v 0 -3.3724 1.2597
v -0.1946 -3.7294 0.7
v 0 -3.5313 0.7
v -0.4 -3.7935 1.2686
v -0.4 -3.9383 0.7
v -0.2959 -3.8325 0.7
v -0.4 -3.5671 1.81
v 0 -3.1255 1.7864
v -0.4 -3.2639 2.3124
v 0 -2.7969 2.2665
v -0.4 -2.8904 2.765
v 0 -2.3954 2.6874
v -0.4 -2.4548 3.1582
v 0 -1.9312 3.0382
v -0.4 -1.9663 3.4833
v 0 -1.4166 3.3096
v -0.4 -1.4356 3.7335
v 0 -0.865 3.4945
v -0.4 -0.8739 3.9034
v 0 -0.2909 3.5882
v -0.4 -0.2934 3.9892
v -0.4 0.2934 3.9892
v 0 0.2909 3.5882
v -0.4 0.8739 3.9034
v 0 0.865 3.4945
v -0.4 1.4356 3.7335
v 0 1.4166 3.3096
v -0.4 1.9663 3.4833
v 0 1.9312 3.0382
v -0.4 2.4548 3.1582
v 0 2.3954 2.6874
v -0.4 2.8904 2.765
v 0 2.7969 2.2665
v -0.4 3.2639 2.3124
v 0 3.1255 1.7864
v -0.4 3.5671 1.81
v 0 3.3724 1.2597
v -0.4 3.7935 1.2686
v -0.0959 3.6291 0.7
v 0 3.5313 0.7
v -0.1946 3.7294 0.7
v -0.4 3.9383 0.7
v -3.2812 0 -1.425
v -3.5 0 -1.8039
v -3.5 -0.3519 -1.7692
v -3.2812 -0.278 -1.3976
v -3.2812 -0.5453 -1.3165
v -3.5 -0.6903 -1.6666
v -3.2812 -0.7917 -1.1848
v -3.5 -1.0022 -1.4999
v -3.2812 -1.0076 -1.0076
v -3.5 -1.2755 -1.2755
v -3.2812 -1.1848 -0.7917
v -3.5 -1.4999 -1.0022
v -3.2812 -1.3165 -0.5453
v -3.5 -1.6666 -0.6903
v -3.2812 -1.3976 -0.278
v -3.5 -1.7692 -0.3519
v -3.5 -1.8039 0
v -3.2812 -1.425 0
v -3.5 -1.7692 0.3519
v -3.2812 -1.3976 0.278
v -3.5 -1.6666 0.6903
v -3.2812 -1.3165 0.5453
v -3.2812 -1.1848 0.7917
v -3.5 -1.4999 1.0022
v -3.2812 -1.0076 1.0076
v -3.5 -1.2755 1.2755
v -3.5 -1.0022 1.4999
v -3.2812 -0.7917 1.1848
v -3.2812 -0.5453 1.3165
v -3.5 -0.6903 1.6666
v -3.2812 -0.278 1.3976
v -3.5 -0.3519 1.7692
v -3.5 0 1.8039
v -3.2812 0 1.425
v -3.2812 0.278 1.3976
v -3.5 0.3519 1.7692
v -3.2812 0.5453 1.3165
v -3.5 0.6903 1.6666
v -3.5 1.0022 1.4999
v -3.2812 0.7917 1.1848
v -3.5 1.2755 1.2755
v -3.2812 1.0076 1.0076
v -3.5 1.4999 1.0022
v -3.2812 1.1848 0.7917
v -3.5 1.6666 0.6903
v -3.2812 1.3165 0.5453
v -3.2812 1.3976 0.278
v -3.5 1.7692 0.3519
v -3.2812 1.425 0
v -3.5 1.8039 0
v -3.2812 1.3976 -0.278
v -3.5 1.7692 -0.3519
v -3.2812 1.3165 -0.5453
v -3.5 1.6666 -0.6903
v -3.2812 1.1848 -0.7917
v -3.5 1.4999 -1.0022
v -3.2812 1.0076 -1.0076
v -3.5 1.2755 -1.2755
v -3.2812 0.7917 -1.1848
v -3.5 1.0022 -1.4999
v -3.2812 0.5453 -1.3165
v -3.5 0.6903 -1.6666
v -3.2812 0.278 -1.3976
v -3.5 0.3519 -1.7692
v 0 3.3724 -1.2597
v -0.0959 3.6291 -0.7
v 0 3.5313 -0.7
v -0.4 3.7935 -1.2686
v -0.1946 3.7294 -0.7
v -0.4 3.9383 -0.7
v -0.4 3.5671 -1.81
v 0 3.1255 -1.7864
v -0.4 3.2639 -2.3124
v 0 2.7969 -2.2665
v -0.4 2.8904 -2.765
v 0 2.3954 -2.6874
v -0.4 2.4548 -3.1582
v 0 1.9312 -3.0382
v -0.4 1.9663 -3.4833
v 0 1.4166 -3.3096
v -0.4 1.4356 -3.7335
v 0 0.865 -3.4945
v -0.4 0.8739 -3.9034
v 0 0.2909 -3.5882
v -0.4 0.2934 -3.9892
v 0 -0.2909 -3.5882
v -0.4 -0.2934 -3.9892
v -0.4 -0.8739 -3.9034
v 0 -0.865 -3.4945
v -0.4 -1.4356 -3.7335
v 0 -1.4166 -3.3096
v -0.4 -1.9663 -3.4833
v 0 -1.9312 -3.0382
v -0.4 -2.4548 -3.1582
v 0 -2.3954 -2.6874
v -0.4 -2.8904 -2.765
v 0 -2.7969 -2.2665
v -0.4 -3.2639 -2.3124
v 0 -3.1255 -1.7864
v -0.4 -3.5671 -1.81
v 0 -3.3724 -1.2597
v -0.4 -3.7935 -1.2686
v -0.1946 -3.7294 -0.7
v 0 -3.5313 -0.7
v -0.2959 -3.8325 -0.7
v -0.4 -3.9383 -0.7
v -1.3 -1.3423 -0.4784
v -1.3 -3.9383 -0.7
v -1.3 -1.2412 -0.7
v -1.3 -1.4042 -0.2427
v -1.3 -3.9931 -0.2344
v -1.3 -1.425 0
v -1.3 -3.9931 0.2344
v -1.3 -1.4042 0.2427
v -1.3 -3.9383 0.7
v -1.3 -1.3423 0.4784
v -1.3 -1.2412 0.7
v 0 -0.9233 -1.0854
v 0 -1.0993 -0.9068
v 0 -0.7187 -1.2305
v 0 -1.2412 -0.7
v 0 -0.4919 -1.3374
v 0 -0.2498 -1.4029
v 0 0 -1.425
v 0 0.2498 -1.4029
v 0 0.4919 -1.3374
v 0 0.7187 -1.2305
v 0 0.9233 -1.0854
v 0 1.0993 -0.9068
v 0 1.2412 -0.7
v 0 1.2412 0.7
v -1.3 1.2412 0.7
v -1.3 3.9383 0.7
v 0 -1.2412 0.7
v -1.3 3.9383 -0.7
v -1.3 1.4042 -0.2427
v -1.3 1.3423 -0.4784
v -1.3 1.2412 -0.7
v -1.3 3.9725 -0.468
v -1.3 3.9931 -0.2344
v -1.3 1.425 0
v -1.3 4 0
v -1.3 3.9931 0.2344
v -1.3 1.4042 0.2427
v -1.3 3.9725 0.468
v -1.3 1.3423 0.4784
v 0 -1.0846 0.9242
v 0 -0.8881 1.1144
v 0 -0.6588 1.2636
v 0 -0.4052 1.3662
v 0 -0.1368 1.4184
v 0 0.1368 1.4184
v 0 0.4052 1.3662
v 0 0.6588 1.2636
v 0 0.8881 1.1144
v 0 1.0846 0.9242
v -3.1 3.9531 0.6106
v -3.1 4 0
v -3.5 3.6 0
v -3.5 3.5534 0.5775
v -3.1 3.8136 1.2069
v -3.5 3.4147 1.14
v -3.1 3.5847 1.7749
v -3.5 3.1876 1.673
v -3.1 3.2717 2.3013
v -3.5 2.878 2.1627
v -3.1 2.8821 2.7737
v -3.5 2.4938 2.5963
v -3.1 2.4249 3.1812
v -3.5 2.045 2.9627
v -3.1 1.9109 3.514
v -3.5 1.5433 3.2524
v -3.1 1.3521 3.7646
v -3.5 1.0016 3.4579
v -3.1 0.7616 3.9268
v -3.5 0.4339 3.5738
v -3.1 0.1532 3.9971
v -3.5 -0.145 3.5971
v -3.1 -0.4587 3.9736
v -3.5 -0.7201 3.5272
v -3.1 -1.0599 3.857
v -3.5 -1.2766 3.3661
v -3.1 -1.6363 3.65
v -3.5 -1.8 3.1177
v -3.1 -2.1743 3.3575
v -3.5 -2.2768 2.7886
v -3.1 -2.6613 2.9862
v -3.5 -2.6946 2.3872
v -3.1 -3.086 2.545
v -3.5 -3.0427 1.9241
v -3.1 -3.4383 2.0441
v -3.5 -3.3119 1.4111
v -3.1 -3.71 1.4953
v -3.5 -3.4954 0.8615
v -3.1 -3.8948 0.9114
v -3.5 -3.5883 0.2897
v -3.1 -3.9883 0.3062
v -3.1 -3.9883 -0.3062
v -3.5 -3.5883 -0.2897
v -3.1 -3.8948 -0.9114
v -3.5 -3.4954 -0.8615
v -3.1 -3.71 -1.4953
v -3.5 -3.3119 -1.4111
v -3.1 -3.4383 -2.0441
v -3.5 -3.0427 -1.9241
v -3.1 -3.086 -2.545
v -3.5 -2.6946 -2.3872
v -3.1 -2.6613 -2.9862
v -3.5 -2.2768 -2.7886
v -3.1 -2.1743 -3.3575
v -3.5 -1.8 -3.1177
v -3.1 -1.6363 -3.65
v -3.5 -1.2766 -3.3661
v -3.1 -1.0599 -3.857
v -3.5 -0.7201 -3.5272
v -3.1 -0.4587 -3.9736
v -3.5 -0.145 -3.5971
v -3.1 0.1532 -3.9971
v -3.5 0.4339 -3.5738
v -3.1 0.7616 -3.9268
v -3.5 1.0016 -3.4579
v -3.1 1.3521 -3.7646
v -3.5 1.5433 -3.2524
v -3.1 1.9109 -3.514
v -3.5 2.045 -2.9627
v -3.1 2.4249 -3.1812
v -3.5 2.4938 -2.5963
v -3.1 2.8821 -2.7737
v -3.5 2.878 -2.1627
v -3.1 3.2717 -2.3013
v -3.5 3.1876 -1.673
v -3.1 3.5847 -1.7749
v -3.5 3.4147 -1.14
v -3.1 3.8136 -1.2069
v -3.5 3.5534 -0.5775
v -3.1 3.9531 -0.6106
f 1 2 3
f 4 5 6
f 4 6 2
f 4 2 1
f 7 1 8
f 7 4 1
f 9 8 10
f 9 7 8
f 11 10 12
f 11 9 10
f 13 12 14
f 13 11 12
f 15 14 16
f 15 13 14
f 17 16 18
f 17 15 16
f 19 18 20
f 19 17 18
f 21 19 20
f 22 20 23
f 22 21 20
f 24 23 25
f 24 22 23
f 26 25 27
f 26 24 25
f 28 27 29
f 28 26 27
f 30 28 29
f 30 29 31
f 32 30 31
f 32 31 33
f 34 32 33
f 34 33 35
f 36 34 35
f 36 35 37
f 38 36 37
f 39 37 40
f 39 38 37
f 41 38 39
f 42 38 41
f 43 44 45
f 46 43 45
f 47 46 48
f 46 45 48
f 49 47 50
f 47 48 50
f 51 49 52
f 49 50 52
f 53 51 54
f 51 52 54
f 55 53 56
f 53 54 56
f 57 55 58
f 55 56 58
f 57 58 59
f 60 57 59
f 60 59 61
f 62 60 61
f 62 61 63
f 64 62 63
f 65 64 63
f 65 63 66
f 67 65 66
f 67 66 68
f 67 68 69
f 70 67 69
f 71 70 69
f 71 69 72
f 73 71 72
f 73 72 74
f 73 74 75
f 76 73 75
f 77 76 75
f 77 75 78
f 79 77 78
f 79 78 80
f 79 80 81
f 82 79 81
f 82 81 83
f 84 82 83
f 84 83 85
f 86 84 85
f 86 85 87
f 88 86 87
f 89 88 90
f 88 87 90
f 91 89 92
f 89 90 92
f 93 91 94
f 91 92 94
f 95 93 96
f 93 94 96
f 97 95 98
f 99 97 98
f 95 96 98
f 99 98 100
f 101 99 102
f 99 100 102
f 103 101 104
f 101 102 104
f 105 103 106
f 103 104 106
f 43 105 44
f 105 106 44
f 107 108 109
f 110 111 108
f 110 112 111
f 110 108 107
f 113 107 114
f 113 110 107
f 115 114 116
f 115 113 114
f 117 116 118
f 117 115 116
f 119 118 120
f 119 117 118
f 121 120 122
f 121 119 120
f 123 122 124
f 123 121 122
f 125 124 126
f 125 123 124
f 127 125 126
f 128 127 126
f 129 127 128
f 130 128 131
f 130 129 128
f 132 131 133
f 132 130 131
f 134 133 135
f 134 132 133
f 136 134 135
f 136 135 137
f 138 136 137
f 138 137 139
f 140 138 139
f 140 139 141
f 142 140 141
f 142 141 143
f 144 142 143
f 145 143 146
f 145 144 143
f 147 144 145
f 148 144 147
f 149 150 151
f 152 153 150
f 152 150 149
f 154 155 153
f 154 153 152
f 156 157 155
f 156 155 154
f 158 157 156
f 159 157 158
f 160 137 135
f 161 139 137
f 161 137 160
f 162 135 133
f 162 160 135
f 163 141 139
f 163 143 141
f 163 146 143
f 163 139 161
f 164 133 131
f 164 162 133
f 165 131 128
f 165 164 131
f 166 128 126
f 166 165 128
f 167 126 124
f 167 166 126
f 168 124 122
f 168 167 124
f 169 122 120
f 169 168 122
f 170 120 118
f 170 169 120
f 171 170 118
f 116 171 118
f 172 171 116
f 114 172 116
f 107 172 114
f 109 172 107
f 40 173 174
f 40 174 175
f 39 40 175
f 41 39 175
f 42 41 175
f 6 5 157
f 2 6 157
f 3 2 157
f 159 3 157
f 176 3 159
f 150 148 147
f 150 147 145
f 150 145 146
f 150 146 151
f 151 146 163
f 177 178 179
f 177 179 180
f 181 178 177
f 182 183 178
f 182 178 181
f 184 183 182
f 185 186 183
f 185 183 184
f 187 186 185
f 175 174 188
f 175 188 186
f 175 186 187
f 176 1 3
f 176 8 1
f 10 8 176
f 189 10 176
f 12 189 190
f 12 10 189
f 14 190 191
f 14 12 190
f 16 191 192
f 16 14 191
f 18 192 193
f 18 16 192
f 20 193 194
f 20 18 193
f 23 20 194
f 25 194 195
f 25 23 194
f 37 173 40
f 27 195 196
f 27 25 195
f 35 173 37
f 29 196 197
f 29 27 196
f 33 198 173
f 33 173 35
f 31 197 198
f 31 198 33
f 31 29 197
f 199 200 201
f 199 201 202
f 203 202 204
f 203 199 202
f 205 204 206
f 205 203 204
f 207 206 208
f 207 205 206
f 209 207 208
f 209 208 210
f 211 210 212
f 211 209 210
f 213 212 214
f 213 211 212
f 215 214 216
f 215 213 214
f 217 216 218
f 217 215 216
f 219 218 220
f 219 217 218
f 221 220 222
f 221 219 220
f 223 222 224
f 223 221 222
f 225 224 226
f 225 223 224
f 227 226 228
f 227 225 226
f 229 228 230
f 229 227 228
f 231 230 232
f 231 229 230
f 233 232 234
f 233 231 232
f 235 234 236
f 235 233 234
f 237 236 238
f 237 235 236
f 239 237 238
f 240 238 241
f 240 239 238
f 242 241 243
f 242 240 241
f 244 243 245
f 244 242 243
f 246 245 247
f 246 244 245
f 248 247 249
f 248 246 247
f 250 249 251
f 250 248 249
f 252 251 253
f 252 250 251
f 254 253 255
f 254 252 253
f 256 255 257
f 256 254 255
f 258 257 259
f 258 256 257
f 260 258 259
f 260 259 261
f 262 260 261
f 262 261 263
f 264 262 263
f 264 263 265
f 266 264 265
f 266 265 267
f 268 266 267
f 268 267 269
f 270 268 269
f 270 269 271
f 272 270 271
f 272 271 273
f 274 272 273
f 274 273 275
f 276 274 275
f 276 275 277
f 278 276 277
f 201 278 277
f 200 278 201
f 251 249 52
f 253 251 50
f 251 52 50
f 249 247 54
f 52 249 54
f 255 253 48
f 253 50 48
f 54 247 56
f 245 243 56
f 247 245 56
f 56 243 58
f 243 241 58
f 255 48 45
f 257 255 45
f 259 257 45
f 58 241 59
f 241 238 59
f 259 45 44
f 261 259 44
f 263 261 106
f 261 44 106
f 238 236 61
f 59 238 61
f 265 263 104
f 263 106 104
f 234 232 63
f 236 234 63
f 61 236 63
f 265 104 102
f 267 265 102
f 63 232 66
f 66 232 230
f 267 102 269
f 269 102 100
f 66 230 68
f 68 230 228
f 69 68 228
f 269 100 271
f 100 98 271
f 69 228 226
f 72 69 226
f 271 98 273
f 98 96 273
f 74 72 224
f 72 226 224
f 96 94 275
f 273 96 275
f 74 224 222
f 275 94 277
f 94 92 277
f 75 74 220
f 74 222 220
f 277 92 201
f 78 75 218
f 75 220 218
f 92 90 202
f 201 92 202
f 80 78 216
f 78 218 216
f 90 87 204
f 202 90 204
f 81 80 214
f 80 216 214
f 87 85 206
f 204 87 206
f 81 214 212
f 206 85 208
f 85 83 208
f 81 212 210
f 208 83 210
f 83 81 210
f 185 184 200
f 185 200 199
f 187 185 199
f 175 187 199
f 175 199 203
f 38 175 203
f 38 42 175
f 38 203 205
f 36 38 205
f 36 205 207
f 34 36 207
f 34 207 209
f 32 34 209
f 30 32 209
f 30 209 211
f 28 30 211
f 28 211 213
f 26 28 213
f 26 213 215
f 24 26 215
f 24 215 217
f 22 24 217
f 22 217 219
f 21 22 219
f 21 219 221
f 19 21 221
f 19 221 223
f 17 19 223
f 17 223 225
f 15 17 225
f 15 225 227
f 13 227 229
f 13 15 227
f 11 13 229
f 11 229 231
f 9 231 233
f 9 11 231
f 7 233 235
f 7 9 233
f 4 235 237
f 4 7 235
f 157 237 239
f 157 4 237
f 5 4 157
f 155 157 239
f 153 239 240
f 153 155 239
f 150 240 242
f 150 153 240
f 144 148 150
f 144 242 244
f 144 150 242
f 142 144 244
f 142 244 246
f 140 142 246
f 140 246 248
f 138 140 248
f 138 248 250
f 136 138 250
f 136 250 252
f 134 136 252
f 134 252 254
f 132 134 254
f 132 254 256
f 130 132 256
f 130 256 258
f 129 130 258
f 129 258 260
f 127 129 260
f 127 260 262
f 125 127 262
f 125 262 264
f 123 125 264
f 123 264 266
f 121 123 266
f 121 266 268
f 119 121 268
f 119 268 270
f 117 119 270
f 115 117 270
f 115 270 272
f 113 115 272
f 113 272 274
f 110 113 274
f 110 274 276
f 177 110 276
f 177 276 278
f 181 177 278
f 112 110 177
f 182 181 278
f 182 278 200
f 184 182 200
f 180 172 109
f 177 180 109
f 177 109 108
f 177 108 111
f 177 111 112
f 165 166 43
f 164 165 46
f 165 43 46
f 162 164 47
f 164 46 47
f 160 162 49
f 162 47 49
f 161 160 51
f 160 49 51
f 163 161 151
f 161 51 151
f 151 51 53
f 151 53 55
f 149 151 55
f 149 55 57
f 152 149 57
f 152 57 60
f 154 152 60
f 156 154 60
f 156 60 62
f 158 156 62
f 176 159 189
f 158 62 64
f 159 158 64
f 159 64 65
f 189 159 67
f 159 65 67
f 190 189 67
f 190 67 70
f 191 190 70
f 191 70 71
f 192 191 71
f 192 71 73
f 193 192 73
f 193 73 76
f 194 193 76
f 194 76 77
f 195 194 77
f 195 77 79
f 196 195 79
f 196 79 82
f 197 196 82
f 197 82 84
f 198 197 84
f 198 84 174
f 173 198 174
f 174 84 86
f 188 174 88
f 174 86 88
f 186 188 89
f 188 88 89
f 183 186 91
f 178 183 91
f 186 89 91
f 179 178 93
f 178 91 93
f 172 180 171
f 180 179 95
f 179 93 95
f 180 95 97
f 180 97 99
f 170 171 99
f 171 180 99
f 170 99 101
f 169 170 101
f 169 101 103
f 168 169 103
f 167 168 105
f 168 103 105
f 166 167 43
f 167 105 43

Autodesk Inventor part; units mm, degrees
ref_plane "YZ Plane" through (0, 0, 0) normal (1, 0, 0) x (0, 1, 0)
ref_plane "XZ Plane" through (0, 0, 0) normal (0, 1, 0) x (-1, 0, 0)
sketch "Эскиз1" plane through (0, 0, 0) normal (1, 0, 0) x (0, 1, 0)
  circle A0 centre (0, 0) radius 4
  line L0 (0, 0) -> (4, 0) construction
  line L1 (-3.9383, 0.7) -> (3.9383, 0.7)
  line L2 (-3.9383, -0.7) -> (3.9383, -0.7)
  dimension "d0" = 8
  dimension "d3" = 1.4
extrude "Базовый элемент" add sketch "Эскиз1" against normal blind 3.5
chamfer "Фаска1" distance 0.4 angle 45 1 edges at (-3.5, 3.9383, 0.7) measured on face at (-3.5, -0.0835, 1.1778)
chamfer "Фаска2" distance 0.4 angle 45 1 edges at (0, 3.9383, 0.7) measured on face at (0, 0.1896, 0.4332)
extrude "Паз" cut sketch "Эскиз1" against normal blind 1.3 contours A0 L2 L1
hole "Резьба" at (0, 0, 0) direction (-1, 0, 0) diameter 2.85 end through all thread size "M3.5x0.6" class "6H" standard "ISO Metric profile"
chamfer "Фаска3" distance 0.3789 angle 30 1 edges at (-3.5, 0, 1.425) measured on face at (-3.5, -2.8504, -0.1884)
ref_plane "Work Plane1" through (-11.8427, 0, 0) normal (0, 0, -1) x (1, 0, 0)
equation "\"d0\" = SD2"
equation "\"d3\" = SBR"
equation "\"d1\" = KOH"
equation "\"d8\" = PHH"
equation "\"d9\" = FAWI"
equation "\"d55\" = PHH"
equation "\"d10\" = PHH"
equation "\"d11\" = FAWI"
equation "\"d56\" = PHH"
equation "\"d4\" = STI"
equation "\"d6\" = -0.5 * GD1 + 0.5 * NND"
equation "\"d57\" = -0.5 * GD1 + 0.5 * NND"
equation "\"FAWI\" = 45deg"
equation "\"NND\" = 4"
equation "\"KOH\" = 3.5"
equation "\"SD2\" = 8"
equation "\"PHH\" = 0.4"
equation "\"SBR\" = 1.4"
equation "\"STI\" = 1.3"
equation "\"GUL\" = 0.541266 * PTC"
equation "\"THREADDIA\" = 4"
equation "\"TOA\" = 30deg"
equation "\"PTC\" = 0.7"
equation "\"GAL\" = 0.541266 * PTC"
equation "\"GD1\" = 3.242228"
properties part number "Гайка M4-6H ГОСТ 10657-80" material "Сталь, мягкая"
